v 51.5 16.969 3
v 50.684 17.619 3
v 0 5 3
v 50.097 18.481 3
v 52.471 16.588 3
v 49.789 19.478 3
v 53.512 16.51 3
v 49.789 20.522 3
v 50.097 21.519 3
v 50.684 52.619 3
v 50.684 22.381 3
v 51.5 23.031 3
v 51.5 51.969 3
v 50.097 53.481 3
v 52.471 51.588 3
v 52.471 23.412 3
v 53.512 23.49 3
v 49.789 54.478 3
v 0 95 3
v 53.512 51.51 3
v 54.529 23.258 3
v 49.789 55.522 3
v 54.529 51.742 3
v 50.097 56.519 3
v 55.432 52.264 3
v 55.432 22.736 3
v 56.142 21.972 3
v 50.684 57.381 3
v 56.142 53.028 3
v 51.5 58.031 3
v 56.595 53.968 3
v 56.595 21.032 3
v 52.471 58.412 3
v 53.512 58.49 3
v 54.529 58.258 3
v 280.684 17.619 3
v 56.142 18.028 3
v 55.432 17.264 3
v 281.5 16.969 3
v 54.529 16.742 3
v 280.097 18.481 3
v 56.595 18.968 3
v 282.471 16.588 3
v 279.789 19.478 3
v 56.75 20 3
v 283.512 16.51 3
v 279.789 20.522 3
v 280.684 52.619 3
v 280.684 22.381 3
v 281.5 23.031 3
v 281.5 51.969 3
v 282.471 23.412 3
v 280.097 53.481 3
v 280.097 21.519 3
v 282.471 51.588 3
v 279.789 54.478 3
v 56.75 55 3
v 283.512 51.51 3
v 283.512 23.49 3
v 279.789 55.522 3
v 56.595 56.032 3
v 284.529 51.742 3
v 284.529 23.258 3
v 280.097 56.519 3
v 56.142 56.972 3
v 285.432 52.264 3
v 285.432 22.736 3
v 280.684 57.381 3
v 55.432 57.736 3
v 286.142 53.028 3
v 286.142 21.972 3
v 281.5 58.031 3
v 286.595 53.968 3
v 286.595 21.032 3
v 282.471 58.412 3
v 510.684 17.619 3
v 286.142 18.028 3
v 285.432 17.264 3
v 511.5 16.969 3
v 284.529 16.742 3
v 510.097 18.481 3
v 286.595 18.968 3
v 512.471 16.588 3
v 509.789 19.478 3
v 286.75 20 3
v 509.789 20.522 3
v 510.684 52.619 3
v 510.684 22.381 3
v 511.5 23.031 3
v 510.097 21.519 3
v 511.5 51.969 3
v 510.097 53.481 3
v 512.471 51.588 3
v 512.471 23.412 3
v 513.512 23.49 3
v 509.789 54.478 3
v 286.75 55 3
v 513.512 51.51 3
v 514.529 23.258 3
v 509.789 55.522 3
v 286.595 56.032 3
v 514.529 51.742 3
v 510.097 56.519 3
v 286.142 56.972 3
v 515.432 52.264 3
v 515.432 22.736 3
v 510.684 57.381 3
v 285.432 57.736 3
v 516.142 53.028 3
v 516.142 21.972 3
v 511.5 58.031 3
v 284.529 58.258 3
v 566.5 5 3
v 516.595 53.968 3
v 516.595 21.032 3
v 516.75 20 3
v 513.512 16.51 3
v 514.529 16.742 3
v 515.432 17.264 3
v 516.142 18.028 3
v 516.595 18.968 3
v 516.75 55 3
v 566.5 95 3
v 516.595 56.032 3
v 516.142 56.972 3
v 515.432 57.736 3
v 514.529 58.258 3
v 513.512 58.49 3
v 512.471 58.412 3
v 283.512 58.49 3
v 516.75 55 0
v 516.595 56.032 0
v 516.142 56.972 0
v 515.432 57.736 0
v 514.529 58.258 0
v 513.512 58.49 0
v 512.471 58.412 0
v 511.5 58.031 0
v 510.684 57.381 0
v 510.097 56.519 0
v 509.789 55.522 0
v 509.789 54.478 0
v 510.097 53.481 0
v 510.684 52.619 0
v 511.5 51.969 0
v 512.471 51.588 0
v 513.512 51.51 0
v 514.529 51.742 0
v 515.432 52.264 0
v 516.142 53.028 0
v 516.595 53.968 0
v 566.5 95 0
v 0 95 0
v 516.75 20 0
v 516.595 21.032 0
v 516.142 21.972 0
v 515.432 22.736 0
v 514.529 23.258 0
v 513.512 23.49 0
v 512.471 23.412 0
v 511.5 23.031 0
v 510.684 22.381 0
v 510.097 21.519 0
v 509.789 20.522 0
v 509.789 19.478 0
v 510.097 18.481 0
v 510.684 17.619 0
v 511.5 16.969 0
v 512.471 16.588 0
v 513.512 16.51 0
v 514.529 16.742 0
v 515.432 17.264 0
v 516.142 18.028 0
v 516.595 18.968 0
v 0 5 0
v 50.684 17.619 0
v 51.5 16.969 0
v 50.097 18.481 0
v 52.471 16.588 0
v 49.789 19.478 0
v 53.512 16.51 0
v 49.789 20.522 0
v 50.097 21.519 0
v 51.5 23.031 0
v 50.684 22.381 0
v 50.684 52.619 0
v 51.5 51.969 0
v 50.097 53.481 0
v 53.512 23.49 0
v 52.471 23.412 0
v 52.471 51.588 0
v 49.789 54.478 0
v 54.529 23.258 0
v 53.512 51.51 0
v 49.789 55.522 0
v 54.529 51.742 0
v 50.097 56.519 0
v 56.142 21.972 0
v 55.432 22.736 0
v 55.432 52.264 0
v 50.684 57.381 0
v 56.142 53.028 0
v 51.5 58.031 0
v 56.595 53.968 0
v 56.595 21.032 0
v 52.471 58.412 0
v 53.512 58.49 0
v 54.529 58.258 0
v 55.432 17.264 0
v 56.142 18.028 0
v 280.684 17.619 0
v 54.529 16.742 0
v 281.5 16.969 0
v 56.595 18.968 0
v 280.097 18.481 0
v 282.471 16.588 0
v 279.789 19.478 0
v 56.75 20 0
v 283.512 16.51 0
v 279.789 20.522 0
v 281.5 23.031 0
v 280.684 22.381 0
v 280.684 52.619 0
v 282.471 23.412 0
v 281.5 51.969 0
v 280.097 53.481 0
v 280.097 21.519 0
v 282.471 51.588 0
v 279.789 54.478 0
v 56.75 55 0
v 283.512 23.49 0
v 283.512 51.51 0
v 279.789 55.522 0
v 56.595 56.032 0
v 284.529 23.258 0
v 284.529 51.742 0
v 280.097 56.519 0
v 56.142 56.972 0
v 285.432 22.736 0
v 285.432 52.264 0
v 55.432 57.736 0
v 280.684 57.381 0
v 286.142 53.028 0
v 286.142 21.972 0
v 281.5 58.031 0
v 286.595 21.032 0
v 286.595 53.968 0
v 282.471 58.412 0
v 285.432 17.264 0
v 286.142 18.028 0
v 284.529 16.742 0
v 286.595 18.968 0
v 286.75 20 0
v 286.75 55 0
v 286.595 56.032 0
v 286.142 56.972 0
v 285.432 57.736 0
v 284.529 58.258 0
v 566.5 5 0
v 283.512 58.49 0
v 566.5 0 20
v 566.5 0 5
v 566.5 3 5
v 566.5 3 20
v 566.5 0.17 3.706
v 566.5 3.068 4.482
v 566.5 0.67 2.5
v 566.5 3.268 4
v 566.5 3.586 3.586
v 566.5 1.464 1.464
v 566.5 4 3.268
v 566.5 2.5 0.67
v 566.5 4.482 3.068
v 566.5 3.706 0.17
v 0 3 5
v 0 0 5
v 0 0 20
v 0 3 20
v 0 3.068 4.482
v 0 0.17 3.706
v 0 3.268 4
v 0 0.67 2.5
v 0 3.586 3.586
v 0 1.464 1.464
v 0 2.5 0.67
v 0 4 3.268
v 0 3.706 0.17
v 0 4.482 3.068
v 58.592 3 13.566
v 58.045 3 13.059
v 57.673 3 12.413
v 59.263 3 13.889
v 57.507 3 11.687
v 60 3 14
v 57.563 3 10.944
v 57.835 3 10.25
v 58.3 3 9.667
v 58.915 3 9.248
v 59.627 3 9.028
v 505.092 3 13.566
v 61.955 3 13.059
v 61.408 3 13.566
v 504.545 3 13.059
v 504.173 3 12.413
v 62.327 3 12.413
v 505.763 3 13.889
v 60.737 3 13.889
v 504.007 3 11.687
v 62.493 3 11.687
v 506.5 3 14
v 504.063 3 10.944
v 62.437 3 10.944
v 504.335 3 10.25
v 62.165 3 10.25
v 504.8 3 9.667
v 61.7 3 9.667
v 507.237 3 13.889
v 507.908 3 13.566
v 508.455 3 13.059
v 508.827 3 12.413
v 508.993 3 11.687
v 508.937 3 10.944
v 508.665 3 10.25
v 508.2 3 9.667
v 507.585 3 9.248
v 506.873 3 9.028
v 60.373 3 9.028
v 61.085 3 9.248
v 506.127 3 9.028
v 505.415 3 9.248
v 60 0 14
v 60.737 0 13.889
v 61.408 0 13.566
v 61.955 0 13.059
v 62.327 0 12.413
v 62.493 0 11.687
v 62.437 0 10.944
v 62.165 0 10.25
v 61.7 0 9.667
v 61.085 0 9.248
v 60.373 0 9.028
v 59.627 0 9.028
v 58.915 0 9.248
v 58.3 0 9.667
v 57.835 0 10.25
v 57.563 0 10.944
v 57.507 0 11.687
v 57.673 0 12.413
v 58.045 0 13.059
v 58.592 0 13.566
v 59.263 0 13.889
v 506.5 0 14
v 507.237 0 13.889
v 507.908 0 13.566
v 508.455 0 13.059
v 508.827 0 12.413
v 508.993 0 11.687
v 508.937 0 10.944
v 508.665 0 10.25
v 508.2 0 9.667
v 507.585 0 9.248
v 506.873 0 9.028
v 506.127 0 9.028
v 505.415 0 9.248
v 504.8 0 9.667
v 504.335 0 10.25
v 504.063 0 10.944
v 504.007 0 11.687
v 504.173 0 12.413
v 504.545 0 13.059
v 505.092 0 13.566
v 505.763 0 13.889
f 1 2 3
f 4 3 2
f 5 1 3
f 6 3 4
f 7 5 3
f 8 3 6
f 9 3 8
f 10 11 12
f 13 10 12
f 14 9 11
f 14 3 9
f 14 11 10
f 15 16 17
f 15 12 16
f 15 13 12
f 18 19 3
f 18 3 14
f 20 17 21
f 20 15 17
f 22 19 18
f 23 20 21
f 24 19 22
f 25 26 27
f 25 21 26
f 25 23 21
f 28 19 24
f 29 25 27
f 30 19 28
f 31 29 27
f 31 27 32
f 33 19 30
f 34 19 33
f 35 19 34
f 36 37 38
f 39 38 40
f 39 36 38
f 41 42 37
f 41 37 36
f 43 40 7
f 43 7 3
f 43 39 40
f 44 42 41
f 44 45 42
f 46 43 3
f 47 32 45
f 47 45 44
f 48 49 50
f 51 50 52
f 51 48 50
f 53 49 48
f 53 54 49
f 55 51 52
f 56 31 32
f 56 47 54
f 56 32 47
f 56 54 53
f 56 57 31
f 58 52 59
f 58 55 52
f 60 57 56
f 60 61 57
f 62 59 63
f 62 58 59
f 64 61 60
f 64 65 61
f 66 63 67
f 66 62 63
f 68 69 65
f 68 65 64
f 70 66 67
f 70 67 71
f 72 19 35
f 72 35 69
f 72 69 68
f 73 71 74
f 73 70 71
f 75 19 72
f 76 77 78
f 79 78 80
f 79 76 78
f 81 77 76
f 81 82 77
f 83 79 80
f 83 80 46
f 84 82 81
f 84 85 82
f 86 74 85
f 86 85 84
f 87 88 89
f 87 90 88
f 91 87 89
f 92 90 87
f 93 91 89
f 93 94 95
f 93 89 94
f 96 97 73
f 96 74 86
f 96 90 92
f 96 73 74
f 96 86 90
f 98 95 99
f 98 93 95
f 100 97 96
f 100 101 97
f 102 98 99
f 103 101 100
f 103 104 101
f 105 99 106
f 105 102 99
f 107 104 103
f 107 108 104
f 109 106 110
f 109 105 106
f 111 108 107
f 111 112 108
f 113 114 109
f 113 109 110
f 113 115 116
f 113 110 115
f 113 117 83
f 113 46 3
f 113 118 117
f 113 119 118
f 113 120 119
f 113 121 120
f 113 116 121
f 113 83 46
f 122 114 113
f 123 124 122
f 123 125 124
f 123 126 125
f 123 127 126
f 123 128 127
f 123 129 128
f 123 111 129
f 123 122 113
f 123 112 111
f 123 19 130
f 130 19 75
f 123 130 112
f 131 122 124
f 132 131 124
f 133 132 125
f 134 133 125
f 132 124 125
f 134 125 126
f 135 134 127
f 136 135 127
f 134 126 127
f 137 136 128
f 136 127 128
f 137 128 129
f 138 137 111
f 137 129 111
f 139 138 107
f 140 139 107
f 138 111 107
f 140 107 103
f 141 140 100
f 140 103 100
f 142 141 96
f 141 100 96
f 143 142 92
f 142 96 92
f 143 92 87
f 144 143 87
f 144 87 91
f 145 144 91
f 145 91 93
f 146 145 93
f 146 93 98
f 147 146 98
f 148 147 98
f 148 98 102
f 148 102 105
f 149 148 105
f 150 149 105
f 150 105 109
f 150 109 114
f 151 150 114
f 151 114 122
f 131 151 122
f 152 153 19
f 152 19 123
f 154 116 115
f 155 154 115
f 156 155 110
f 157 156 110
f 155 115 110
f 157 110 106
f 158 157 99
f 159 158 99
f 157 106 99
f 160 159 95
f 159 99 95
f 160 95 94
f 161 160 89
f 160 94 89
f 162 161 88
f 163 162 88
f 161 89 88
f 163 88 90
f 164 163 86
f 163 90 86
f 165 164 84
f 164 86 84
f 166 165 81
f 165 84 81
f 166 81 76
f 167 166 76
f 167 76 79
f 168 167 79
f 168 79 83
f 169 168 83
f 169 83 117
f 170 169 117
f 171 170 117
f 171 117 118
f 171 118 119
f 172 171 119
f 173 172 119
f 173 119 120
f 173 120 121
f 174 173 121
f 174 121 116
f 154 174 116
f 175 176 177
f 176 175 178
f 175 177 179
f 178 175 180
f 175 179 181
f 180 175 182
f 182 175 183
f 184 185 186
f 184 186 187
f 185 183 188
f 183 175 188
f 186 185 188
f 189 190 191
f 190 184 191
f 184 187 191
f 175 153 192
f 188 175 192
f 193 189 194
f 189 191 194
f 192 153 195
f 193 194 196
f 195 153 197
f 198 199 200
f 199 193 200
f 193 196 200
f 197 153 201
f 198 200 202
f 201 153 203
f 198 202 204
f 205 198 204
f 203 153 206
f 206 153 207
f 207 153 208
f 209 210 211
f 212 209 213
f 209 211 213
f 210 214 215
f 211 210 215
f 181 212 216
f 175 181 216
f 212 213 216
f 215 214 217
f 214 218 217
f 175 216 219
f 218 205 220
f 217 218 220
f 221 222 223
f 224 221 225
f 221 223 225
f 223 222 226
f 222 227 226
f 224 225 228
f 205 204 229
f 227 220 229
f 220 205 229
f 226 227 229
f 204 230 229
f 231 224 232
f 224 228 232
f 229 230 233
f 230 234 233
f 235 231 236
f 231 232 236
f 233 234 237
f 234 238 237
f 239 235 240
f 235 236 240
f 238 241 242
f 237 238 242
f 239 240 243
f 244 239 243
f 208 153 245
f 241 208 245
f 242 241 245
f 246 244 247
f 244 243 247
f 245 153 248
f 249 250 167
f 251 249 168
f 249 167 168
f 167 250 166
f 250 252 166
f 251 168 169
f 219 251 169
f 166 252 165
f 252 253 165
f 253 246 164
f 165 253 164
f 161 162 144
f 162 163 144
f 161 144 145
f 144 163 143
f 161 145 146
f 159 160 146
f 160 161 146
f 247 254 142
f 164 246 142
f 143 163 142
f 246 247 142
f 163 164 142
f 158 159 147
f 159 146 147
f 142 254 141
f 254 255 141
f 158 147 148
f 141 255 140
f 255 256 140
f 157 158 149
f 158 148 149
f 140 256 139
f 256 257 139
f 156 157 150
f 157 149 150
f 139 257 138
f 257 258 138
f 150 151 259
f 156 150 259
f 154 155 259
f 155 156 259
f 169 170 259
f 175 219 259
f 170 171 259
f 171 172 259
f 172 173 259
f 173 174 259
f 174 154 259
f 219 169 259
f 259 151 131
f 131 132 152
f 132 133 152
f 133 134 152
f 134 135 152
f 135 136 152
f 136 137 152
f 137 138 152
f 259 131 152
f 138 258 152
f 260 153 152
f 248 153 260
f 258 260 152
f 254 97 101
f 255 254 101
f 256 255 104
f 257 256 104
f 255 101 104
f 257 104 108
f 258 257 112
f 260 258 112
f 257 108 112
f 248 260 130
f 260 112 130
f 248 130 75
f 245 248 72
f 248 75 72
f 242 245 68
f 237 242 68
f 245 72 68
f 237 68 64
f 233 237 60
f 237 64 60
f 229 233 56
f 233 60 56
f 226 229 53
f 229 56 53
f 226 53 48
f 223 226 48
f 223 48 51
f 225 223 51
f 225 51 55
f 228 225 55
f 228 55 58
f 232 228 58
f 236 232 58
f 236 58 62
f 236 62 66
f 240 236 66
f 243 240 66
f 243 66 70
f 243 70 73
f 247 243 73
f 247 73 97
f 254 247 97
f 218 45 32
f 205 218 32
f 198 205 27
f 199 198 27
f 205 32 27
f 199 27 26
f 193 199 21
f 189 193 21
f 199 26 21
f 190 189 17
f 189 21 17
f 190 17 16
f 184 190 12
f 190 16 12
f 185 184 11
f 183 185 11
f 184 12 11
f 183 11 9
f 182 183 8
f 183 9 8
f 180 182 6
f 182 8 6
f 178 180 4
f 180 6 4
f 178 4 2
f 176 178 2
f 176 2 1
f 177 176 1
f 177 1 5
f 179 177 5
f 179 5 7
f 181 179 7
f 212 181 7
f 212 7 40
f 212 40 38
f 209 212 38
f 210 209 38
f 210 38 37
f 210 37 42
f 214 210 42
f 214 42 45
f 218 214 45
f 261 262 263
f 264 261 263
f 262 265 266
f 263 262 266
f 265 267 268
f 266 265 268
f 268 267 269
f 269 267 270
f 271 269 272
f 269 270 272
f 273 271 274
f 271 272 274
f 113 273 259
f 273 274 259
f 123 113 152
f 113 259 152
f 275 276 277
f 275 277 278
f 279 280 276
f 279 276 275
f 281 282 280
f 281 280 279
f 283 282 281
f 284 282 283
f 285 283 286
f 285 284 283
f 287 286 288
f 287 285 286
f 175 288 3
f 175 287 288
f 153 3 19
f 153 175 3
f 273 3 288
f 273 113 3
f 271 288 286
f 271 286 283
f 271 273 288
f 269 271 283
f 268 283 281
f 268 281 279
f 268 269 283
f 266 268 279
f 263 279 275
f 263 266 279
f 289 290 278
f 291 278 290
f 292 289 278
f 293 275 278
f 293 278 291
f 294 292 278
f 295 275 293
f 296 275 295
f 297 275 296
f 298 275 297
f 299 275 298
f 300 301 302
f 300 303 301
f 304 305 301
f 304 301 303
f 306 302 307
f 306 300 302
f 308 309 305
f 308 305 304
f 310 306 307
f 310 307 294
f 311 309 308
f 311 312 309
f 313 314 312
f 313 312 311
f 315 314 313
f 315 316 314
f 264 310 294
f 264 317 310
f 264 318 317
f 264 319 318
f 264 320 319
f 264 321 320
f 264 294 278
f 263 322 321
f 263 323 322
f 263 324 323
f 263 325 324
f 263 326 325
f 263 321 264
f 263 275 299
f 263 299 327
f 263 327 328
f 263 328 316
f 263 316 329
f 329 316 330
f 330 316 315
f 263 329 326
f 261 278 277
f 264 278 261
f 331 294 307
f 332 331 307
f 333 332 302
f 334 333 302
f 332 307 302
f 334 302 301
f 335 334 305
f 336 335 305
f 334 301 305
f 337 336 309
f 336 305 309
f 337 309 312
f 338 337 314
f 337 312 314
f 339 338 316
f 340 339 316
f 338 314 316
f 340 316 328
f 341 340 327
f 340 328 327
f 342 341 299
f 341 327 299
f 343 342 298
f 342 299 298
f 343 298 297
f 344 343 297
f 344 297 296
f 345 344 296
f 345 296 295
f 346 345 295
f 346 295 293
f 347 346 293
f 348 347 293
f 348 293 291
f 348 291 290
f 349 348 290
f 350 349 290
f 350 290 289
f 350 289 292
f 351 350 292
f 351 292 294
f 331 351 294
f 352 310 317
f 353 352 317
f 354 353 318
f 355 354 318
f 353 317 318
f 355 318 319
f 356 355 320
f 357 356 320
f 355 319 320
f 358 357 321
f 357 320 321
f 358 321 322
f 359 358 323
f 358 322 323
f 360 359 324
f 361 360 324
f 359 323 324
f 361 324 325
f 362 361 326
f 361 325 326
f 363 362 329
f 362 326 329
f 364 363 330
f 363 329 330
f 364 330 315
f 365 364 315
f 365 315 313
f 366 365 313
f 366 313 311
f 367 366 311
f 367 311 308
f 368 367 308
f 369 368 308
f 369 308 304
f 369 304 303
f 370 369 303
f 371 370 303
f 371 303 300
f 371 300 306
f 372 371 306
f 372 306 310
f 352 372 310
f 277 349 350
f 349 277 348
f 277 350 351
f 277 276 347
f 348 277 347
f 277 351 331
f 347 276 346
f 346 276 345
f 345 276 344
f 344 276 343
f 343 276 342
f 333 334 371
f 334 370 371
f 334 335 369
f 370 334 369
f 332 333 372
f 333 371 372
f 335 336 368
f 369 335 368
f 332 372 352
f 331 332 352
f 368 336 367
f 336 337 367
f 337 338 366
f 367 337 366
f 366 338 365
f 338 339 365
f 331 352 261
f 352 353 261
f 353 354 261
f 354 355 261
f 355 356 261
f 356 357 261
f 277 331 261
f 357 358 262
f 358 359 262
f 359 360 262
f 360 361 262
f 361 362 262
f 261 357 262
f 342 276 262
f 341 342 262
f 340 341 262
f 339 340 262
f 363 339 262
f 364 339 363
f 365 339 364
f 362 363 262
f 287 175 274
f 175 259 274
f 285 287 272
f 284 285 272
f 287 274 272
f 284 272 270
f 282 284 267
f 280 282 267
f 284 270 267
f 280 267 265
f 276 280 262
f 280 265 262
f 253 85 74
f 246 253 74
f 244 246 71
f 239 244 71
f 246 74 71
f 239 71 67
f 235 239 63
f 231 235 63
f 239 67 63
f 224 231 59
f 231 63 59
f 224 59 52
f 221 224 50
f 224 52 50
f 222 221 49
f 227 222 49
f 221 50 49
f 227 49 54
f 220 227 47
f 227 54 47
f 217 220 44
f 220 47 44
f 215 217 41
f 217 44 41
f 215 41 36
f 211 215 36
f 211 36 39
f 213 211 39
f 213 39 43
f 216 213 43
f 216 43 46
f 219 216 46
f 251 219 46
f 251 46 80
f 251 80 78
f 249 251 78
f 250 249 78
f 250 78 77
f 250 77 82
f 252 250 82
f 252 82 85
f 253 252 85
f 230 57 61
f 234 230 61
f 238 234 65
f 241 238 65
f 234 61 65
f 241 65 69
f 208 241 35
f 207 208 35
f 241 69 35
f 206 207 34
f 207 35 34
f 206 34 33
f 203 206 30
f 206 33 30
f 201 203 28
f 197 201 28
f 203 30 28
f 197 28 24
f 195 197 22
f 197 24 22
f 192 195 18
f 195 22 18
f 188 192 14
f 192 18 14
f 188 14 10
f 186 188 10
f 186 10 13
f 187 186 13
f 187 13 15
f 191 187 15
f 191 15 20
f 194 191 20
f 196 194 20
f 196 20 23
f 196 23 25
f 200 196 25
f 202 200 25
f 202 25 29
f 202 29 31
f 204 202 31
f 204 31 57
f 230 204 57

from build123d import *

# Parameters (mm, degrees)
SKETCH_1_W          = 566.5
SKETCH_1_H          = 95
EXTRUDE_1_DEPTH     = 3
SKETCH_2_W          = 566.5
SKETCH_2_H          = 3
EXTRUDE_2_DEPTH     = 17
SKETCH_3_R          = 3.5
CUT_EXTRUDE_1_DEPTH = 575.661857095
SKETCH_4_R          = 2.5
CUT_EXTRUDE_2_DEPTH = 575.270189023
FILLET_1_R          = 5
FILLET_2_R          = 2


with BuildPart() as part:
    # 스케치1 → 보스-돌출1 (new body)
    with BuildSketch(Plane.XY):
        with Locations((283.25, 47.5)):
            Rectangle(SKETCH_1_W, SKETCH_1_H)
    extrude(amount=EXTRUDE_1_DEPTH)

    # 스케치2 → 보스-돌출2 (add)
    with BuildSketch(Plane.XY.offset(3)):
        with Locations((283.25, 1.5)):
            Rectangle(SKETCH_2_W, SKETCH_2_H)
    extrude(amount=EXTRUDE_2_DEPTH)

    # 스케치3 → 컷-돌출1 (cut, through all)
    with BuildSketch(Plane.XY.offset(3)):
        with Locations((53.25, 55)):
            Circle(SKETCH_3_R)
        with Locations((53.25, 20)):
            Circle(SKETCH_3_R)
        with Locations((283.25, 55)):
            Circle(SKETCH_3_R)
        with Locations((283.25, 20)):
            Circle(SKETCH_3_R)
        with Locations((513.25, 55)):
            Circle(SKETCH_3_R)
        with Locations((513.25, 20)):
            Circle(SKETCH_3_R)
    extrude(amount=-CUT_EXTRUDE_1_DEPTH, mode=Mode.SUBTRACT)

    # 스케치4 → 컷-돌출2 (cut, through all)
    with BuildSketch(Plane(origin=(0, 3, 0), x_dir=(1, 0, 0), z_dir=(0, 1, 0))):
        with Locations(Location((60, -11.5, 0), (0, 0, 270))):
            Circle(SKETCH_4_R)
        with Locations(Location((506.5, -11.5, 0), (0, 0, 270))):
            Circle(SKETCH_4_R)
    extrude(amount=-CUT_EXTRUDE_2_DEPTH, mode=Mode.SUBTRACT)

    # 필렛1
    fillet_1_edges = [part.edges().sort_by_distance(p)[0] for p in [
        (283.25, 0, 0),
    ]]
    fillet(fillet_1_edges, radius=FILLET_1_R)

    # 필렛2
    fillet_2_edges = [part.edges().sort_by_distance(p)[0] for p in [
        (283.25, 3, 3),
    ]]
    fillet(fillet_2_edges, radius=FILLET_2_R)


solid = part.part
